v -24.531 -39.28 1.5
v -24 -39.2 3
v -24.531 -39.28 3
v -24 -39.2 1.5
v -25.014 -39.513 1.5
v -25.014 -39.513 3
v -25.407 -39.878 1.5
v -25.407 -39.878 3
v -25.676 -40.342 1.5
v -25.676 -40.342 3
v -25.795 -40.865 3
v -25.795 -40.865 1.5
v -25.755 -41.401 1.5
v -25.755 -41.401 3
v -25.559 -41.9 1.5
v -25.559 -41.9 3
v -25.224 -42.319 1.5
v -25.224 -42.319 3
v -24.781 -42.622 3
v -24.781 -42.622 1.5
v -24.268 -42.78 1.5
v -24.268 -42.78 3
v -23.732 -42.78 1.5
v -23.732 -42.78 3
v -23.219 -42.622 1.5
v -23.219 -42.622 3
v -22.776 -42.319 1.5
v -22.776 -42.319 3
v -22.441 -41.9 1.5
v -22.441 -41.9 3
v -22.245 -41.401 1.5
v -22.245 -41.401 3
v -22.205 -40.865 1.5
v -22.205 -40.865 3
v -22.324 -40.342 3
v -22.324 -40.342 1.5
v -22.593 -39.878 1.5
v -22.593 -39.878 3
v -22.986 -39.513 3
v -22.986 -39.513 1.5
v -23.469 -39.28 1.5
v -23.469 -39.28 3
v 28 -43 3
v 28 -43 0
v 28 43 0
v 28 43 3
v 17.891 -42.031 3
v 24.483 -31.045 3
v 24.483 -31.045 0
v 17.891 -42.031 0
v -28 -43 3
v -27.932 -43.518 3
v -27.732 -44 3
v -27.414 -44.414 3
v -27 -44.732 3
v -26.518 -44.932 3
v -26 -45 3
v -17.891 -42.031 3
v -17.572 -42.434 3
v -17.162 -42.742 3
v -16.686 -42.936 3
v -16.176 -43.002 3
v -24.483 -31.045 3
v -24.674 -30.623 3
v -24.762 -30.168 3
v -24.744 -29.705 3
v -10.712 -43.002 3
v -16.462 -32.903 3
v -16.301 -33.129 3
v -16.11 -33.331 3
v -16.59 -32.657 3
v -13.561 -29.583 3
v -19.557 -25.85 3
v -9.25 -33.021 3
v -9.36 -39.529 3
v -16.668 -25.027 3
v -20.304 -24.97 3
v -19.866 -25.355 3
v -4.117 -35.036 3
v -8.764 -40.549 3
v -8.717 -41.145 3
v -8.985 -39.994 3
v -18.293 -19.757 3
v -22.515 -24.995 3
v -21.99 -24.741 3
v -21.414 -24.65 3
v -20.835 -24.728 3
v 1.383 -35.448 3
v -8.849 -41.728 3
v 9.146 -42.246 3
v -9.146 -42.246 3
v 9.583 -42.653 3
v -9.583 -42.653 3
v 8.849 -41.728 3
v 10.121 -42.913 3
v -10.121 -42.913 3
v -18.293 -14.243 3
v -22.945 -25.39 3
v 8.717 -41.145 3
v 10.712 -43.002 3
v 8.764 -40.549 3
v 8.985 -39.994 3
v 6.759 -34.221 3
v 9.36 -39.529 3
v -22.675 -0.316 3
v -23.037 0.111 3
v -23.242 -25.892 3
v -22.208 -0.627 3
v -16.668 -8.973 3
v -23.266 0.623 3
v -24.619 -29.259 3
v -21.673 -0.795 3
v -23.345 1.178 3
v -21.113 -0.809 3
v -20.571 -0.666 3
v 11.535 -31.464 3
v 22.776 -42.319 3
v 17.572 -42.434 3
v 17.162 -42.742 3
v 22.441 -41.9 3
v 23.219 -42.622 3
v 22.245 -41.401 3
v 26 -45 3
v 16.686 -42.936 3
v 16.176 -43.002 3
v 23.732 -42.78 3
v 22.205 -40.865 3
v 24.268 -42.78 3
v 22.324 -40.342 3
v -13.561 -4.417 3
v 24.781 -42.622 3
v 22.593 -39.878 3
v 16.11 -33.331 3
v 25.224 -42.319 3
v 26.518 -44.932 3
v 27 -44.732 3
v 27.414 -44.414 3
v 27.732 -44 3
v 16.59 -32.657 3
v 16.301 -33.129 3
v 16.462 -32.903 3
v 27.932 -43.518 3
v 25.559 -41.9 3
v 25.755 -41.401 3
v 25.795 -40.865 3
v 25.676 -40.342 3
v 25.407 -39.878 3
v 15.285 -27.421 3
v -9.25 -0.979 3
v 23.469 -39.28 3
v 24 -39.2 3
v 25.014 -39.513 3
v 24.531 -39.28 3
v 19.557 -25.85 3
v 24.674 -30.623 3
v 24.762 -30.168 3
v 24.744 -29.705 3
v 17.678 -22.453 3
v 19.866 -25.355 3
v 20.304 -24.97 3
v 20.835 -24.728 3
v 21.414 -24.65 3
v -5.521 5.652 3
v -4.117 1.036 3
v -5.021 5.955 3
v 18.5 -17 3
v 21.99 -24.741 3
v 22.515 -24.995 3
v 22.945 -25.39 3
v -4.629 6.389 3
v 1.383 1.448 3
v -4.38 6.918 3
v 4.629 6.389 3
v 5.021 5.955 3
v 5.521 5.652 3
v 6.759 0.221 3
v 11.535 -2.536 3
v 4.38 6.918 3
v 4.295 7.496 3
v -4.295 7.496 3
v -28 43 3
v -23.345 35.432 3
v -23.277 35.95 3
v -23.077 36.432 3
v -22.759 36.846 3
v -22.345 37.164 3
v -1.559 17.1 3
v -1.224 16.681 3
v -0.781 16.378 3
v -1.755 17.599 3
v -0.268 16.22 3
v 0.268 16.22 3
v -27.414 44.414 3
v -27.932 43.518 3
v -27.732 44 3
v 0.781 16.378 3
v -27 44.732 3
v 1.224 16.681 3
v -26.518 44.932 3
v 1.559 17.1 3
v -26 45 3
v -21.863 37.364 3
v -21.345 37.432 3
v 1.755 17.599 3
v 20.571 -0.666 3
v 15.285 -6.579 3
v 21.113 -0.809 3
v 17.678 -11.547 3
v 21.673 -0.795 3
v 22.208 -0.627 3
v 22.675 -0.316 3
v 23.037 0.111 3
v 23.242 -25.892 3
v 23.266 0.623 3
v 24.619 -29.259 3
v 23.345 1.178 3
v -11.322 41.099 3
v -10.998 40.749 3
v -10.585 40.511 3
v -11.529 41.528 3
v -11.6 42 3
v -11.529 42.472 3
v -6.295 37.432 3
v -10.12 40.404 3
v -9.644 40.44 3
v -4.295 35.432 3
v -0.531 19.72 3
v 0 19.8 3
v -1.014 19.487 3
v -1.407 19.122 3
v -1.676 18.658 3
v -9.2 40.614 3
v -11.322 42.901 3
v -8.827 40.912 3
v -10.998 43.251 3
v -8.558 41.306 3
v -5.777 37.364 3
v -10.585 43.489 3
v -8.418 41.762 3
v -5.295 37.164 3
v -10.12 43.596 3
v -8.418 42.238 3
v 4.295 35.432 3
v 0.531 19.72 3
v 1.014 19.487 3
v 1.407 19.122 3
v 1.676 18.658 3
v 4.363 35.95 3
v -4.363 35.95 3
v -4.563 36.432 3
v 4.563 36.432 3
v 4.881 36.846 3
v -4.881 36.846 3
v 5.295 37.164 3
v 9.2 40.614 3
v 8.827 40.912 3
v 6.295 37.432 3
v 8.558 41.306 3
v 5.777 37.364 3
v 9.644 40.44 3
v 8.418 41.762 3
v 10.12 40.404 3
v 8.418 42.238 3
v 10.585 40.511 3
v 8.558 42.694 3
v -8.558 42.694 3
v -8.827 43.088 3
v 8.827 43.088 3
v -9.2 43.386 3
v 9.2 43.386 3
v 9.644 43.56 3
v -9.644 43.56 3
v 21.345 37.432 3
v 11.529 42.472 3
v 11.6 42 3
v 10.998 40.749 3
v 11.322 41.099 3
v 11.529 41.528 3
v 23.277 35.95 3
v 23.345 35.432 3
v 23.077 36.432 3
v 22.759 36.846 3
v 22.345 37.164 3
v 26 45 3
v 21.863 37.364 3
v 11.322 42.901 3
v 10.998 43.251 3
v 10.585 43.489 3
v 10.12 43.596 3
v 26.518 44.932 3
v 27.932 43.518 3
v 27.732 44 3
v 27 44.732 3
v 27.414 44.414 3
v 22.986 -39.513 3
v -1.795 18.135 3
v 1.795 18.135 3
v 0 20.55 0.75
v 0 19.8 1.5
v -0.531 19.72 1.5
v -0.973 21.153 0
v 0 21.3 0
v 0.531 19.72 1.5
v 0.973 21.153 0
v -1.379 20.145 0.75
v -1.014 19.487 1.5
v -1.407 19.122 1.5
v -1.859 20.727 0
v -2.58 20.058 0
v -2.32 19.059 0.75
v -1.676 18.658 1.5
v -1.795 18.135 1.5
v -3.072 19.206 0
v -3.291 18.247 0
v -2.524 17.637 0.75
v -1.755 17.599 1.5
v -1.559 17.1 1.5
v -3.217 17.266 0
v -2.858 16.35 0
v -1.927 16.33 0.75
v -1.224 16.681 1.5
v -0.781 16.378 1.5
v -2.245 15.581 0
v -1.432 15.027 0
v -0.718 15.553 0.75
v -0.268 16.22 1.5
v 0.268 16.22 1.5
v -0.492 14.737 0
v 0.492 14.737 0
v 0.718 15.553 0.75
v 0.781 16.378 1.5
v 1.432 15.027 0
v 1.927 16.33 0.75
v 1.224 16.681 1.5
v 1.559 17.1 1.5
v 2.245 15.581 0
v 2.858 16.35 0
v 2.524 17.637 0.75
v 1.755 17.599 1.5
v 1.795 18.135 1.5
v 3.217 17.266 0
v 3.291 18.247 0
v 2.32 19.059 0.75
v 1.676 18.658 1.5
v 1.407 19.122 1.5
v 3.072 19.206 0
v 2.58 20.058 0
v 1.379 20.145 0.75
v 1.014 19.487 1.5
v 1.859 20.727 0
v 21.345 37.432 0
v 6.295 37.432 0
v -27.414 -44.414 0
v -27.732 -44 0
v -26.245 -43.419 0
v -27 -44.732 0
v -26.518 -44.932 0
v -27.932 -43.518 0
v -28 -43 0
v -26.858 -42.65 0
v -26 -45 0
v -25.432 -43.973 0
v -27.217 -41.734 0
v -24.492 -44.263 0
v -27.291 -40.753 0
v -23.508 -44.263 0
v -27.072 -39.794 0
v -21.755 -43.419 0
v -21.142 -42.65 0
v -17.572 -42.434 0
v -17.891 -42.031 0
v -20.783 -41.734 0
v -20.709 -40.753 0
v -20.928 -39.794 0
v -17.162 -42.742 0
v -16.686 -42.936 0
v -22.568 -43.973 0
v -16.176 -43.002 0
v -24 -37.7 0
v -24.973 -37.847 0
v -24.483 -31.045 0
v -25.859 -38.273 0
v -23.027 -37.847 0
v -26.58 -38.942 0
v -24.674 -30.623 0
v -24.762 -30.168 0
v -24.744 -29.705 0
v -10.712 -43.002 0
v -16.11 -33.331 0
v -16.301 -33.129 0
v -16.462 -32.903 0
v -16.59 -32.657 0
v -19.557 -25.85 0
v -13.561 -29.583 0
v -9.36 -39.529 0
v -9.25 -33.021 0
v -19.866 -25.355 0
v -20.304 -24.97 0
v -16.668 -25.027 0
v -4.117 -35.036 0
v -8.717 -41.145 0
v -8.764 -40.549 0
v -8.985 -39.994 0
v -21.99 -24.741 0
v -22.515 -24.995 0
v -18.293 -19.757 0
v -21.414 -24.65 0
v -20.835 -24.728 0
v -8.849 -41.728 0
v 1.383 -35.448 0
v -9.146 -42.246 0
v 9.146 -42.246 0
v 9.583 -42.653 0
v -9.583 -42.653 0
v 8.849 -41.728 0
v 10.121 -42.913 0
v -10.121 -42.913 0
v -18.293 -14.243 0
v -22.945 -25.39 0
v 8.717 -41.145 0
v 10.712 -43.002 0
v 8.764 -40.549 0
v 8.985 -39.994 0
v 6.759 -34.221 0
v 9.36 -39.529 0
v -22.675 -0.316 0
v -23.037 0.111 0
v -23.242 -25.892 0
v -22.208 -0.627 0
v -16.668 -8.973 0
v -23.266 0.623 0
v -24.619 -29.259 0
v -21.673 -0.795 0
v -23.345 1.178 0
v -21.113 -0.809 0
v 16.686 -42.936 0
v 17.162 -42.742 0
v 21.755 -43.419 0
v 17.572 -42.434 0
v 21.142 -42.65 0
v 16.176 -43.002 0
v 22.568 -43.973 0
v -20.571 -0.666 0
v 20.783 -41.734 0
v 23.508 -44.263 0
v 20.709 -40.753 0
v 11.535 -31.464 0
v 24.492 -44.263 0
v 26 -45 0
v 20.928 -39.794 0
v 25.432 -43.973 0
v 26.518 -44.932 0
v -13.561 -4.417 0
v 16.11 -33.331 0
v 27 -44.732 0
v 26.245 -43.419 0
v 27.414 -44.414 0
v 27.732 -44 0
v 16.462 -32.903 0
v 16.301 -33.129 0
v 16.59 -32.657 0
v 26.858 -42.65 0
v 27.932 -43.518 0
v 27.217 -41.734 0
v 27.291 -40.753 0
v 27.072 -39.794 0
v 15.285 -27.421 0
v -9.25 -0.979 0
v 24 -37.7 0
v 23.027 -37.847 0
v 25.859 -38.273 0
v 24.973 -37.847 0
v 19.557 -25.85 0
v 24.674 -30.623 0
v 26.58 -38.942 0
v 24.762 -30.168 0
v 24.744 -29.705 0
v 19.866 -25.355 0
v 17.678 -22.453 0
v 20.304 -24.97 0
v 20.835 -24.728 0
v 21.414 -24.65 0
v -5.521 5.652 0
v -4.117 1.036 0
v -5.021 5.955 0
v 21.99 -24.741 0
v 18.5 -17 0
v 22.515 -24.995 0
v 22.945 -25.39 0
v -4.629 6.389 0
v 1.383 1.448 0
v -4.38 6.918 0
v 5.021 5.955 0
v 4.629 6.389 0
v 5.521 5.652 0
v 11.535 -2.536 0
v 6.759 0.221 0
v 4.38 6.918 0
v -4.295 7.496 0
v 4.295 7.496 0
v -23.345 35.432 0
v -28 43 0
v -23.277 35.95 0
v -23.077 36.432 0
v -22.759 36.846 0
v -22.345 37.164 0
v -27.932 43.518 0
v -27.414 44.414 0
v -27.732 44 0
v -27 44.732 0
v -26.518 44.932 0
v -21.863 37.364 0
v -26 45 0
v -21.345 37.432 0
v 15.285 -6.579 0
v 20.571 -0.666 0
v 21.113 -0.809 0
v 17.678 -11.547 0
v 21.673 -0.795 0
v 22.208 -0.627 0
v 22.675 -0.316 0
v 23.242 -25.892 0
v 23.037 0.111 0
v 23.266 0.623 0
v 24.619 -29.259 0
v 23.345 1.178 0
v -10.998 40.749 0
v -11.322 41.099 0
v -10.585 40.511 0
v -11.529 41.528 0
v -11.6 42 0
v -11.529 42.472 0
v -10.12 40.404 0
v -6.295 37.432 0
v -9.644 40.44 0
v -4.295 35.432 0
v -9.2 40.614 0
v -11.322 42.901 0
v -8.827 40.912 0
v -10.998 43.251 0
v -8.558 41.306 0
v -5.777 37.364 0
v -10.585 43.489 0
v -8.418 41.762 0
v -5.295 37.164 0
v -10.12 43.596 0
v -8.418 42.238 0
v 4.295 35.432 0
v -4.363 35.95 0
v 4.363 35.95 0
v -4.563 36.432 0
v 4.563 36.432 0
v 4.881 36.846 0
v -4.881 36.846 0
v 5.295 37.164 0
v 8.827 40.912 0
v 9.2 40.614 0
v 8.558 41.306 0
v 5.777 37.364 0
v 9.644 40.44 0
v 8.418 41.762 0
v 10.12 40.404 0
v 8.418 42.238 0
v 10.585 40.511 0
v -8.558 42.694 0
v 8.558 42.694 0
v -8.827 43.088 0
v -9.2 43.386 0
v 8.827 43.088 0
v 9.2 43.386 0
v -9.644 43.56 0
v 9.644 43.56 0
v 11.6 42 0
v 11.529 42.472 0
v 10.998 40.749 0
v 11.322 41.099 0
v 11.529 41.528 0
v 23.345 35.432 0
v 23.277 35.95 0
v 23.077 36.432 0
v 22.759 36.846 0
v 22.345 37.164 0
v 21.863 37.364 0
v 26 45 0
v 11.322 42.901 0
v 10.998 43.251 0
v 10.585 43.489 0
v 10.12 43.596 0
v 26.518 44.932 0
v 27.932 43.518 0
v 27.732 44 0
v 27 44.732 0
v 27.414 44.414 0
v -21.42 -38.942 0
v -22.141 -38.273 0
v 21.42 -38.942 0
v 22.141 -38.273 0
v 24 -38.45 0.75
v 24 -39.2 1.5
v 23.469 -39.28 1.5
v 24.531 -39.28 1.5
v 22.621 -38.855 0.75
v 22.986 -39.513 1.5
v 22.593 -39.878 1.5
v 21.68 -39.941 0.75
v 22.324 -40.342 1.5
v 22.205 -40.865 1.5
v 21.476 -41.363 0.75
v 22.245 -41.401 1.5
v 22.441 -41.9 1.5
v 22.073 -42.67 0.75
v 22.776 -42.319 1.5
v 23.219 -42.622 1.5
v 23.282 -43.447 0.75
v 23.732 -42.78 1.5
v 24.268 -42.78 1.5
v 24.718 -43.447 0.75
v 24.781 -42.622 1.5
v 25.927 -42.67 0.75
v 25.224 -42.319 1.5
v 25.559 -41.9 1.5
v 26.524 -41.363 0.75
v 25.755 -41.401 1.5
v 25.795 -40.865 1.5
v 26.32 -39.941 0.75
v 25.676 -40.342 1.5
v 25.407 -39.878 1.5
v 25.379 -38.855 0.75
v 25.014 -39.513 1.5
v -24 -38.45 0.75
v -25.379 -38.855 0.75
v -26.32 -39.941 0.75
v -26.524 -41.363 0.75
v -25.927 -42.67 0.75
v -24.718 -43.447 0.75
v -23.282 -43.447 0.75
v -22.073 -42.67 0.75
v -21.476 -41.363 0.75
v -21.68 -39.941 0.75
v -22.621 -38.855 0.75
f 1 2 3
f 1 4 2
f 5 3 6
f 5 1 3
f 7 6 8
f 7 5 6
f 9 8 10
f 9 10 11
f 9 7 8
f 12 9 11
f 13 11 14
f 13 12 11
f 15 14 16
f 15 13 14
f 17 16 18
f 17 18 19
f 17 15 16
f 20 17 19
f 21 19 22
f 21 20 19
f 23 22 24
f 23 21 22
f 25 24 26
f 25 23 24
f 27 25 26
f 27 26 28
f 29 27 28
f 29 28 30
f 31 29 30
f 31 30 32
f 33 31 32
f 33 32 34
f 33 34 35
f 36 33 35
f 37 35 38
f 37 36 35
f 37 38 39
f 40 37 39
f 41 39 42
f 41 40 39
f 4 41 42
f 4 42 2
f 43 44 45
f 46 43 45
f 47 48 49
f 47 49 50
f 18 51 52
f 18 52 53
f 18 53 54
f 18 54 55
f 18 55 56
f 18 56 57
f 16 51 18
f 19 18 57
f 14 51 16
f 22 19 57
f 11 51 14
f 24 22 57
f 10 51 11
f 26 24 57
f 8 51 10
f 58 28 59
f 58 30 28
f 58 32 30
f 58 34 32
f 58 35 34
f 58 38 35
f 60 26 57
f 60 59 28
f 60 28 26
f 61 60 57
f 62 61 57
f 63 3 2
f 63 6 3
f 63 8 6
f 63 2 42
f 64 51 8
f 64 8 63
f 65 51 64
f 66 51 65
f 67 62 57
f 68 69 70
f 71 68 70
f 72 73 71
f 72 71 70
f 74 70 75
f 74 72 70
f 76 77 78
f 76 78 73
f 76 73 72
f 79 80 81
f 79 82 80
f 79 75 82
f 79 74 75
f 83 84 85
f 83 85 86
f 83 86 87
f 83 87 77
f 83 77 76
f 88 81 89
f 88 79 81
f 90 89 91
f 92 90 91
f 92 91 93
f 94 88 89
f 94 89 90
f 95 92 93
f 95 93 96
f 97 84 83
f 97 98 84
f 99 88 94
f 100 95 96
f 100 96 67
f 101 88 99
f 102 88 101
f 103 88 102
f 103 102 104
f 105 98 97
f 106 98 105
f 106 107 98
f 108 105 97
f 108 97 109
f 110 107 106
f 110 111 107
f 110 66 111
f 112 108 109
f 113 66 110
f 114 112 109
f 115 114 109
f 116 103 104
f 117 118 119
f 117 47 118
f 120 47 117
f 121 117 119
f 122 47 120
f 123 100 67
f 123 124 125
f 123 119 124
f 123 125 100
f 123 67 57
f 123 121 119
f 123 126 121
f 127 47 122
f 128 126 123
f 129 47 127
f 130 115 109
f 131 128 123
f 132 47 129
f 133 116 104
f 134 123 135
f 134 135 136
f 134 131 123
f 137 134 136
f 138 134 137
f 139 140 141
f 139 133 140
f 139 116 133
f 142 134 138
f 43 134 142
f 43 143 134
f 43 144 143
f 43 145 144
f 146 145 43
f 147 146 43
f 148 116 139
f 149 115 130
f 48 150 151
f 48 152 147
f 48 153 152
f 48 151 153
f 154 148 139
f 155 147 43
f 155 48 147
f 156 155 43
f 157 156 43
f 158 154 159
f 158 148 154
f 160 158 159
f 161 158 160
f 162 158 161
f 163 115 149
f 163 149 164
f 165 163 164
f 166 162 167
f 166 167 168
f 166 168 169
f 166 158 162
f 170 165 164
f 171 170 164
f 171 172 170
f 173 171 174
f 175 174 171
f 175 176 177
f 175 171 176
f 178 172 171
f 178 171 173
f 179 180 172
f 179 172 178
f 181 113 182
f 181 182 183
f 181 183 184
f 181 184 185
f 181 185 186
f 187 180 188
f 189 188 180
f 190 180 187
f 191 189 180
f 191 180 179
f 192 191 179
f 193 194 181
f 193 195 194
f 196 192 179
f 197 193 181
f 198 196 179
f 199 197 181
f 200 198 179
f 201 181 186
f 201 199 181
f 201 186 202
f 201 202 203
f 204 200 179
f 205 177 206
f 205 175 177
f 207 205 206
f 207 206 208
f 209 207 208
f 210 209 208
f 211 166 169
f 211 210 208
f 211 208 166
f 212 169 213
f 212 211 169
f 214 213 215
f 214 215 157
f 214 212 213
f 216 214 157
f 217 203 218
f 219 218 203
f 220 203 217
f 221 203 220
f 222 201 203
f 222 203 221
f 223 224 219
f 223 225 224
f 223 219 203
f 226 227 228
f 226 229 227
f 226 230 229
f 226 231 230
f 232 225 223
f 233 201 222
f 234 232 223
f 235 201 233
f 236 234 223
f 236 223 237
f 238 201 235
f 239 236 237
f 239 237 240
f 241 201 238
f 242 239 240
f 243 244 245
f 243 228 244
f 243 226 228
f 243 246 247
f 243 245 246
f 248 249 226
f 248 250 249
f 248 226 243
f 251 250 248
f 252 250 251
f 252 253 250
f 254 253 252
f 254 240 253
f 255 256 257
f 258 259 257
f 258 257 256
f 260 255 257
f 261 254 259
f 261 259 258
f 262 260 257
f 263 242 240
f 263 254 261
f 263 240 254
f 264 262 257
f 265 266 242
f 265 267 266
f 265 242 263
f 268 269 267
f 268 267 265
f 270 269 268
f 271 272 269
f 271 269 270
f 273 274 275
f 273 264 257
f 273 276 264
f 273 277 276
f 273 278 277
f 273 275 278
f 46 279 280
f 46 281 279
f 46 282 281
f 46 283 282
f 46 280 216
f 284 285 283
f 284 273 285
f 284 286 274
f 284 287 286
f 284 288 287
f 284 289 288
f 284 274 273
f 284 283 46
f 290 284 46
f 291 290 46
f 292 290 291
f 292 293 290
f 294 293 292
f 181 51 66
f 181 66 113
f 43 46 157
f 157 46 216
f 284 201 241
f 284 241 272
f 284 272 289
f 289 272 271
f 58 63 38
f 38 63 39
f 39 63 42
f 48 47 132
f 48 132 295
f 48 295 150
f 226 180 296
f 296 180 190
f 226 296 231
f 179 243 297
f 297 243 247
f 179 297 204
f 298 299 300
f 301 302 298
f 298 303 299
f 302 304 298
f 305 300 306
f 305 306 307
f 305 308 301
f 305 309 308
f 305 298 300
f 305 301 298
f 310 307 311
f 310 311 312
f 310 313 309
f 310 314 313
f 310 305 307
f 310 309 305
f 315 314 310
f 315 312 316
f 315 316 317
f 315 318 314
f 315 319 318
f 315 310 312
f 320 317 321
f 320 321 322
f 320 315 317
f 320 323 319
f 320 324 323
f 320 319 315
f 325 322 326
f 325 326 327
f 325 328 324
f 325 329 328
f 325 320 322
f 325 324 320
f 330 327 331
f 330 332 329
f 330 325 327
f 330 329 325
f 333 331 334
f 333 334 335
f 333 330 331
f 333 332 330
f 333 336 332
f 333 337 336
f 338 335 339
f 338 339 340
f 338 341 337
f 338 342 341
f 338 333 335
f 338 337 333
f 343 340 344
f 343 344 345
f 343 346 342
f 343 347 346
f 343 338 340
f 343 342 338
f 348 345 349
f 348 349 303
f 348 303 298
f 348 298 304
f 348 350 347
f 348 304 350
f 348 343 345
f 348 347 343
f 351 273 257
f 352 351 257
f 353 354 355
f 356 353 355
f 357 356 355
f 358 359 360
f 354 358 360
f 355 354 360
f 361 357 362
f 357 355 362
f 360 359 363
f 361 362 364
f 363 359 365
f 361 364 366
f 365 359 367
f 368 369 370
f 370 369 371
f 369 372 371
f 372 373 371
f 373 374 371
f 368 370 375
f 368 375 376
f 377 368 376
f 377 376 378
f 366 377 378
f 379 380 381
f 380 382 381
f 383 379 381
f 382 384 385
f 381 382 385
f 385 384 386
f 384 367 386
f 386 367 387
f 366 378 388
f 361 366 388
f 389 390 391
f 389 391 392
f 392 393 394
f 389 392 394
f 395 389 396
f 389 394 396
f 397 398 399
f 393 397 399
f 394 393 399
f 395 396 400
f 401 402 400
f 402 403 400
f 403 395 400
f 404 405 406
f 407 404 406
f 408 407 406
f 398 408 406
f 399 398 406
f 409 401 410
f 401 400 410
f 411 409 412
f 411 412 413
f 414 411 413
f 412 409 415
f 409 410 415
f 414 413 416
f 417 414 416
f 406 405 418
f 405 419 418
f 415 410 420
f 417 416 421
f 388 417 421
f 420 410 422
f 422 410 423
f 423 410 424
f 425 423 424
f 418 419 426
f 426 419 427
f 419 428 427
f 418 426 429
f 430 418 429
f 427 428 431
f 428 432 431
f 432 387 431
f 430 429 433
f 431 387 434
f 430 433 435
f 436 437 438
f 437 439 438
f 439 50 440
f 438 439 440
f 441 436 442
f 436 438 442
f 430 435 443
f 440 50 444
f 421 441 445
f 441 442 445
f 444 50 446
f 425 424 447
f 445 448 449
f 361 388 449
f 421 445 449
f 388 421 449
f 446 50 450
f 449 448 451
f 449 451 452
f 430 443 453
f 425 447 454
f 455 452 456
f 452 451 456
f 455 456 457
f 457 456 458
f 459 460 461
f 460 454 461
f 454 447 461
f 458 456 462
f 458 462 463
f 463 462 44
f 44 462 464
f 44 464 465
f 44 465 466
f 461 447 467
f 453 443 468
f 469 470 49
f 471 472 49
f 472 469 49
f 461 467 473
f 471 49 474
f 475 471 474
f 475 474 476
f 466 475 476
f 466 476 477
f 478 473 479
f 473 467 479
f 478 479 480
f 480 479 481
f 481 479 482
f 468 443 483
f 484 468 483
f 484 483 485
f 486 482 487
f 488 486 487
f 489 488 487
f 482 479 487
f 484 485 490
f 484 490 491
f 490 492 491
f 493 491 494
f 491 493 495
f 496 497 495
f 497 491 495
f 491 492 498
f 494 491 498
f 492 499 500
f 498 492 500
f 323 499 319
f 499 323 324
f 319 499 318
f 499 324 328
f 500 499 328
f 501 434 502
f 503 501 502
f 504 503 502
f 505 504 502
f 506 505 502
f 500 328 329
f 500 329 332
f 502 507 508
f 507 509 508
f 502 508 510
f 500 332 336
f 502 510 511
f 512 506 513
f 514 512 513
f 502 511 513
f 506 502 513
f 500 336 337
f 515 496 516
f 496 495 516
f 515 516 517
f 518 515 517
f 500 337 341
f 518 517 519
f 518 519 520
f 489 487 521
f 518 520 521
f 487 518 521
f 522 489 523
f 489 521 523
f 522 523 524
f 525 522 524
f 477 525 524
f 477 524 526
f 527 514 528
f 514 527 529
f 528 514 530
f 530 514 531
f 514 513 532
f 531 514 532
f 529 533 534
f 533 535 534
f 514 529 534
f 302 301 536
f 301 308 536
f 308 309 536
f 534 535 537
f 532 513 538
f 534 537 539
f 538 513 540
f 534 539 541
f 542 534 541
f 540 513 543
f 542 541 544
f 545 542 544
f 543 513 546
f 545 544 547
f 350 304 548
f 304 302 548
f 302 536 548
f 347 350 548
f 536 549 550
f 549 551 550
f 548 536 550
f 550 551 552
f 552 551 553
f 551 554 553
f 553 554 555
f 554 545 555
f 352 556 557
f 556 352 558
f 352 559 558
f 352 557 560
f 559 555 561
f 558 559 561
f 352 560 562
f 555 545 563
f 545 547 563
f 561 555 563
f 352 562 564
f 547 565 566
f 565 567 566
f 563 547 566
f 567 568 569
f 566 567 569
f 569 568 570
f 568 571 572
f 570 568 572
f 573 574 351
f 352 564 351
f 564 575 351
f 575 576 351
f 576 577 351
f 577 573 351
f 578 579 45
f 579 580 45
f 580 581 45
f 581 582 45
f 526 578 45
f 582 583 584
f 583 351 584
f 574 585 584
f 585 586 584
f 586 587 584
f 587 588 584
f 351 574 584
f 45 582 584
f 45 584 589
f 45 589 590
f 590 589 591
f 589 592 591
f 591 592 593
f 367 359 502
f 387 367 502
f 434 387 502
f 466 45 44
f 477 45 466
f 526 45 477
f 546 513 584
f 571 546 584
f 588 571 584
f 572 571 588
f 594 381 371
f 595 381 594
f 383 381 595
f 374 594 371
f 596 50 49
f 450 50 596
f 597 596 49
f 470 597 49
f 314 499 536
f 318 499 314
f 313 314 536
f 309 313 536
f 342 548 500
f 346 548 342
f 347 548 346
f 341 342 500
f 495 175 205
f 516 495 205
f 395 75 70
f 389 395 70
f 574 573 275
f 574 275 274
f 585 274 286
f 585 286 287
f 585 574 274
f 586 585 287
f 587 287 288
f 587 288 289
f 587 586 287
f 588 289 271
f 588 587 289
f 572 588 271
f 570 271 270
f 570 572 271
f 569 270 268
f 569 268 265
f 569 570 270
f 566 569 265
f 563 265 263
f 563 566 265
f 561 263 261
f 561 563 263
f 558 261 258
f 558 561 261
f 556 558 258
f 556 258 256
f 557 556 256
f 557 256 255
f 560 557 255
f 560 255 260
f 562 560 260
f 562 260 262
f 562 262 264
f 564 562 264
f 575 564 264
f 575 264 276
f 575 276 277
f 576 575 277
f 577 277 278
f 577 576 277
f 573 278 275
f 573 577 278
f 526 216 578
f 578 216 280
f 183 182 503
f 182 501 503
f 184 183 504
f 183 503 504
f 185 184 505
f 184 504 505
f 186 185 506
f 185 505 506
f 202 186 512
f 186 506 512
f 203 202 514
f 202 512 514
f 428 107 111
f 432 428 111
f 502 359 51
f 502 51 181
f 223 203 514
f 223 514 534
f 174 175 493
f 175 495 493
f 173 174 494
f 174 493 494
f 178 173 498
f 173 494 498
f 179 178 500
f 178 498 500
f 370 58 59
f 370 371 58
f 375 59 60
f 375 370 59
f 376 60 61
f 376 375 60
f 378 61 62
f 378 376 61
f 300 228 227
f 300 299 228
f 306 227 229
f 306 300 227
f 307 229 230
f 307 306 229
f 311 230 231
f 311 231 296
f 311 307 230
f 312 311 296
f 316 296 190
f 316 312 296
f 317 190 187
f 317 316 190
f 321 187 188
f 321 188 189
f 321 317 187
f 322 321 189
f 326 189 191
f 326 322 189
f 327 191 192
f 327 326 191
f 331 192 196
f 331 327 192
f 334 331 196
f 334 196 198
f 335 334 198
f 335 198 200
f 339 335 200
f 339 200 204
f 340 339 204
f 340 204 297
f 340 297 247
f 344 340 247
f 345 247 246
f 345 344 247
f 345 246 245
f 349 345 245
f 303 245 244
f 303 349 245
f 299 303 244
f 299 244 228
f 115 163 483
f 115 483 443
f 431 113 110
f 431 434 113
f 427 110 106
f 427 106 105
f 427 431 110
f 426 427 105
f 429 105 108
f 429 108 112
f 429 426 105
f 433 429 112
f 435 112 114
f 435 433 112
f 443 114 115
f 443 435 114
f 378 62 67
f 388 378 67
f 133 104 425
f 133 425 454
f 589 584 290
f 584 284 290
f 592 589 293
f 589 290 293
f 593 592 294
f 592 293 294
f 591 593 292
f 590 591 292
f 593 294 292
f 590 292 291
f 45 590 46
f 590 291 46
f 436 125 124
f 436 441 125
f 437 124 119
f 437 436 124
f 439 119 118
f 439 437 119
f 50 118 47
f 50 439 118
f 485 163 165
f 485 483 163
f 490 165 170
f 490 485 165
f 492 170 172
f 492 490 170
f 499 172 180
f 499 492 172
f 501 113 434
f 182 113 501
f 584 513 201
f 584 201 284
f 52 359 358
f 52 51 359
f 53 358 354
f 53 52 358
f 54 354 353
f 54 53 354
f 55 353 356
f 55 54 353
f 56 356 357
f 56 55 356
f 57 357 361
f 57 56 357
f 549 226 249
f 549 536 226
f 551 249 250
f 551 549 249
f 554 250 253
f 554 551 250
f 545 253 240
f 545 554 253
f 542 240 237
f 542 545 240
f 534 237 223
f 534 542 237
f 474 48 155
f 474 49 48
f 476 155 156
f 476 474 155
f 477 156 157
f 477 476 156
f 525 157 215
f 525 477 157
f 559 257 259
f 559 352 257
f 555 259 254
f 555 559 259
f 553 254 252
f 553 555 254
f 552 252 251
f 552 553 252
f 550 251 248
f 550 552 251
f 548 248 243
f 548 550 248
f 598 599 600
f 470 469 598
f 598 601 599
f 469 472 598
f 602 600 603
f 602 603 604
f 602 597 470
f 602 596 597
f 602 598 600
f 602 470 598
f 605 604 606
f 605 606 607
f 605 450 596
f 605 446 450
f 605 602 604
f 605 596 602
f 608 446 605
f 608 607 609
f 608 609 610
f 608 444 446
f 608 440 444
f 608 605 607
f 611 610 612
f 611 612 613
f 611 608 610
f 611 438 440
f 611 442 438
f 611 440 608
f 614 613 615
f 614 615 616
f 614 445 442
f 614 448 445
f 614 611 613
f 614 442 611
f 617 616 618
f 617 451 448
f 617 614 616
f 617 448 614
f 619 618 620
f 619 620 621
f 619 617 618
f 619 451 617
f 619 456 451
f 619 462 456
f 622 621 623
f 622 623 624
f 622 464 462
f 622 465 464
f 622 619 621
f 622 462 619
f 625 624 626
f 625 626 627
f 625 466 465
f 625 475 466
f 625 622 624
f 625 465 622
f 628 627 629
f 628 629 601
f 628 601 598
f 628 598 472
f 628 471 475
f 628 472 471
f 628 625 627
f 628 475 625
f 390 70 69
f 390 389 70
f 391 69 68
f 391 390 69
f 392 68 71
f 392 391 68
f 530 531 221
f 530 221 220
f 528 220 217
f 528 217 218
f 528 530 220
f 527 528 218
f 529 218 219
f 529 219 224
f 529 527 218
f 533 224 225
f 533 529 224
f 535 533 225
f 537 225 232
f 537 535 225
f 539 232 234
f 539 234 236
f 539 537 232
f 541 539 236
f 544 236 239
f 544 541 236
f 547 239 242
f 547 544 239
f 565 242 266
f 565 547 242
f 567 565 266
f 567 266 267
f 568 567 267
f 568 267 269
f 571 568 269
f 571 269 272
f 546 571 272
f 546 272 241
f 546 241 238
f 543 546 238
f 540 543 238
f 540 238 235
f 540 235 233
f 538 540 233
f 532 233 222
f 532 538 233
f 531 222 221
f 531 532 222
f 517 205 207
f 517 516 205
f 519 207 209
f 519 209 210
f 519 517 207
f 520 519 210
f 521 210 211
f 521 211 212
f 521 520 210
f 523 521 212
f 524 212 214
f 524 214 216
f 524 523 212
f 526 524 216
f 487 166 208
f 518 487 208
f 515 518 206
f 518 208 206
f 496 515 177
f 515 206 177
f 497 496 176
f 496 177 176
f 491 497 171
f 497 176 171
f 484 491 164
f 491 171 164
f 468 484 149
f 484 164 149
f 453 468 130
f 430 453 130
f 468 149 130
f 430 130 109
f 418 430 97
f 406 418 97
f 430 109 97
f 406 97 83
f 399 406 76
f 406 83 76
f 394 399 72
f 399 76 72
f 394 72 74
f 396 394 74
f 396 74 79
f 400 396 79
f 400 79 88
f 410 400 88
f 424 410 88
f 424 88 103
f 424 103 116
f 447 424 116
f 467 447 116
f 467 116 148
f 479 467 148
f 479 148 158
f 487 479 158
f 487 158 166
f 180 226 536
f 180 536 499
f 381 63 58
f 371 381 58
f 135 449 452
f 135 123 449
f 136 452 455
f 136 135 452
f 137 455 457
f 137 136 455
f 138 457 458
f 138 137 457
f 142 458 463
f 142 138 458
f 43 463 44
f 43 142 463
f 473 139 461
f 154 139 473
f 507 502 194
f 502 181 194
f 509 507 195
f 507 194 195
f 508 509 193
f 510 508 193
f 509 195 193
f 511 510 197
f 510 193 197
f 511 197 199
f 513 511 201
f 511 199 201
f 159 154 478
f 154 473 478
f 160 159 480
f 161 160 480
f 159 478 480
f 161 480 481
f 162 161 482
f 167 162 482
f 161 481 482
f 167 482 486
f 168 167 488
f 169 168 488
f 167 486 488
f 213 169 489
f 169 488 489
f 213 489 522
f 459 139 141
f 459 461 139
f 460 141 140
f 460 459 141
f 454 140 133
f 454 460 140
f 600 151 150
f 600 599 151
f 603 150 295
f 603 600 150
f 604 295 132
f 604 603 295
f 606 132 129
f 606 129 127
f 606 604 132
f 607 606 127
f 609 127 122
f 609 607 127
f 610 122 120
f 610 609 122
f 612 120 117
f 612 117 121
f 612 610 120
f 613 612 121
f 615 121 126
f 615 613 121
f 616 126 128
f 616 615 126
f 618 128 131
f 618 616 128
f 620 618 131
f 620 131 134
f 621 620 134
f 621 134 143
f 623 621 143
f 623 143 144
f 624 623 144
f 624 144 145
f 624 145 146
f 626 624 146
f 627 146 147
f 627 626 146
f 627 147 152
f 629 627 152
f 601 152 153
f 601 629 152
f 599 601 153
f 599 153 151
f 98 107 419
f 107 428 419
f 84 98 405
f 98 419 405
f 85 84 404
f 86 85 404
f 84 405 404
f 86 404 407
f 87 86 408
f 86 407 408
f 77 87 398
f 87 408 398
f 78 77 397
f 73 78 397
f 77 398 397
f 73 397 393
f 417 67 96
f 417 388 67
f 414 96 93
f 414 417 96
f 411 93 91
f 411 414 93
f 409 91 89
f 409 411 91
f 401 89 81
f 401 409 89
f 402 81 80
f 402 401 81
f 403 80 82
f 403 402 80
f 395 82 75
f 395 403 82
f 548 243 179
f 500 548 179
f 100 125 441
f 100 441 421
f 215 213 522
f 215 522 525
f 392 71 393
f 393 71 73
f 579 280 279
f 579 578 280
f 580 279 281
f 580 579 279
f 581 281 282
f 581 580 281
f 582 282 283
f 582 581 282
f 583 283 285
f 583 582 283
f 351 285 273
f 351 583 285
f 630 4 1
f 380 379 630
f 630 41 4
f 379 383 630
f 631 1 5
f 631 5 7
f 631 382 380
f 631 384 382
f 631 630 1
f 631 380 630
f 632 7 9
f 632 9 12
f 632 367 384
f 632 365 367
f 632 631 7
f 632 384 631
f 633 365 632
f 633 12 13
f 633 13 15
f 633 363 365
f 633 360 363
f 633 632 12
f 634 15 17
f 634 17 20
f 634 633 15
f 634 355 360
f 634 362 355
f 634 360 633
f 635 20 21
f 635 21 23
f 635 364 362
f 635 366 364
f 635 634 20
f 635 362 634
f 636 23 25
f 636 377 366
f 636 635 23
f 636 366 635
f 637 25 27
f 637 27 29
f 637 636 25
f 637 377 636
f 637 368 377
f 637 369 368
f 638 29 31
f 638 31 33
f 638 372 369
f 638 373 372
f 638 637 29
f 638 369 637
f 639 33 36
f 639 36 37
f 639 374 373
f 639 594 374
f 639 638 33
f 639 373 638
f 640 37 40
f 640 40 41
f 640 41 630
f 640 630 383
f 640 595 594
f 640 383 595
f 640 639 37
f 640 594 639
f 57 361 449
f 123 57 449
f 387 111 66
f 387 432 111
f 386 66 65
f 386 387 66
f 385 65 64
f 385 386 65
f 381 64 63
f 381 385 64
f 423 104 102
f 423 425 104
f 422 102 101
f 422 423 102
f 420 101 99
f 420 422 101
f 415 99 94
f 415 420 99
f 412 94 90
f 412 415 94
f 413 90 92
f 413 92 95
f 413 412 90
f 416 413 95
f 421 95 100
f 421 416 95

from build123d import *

# Parameters (mm, degrees)
SKETCH_1_W                  = 56
SKETCH_1_H                  = 90
SKETCH_1_R                  = 1.6
EXTRUDE_1_DEPTH             = 3
SKETCH_2_R                  = 18.5
SKETCH_2_R_2                = 1.6
CUT_EXTRUDE_1_DEPTH         = 54.08483776
FILLET_1_R                  = 2
CUT_EXTRUDE_2_DEPTH         = 54.08483776
FILLET_2_R                  = 2
HOLE_WIZARD_M3_1_AT_2_COUNT = 2
HOLE_WIZARD_M3_1_AT_2_PITCH = 63.694583757
HOLE_WIZARD_M3_1_AT_3_COUNT = 2
HOLE_WIZARD_M3_1_AT_3_PITCH = 63.694583757


with BuildPart() as part:
    # 草图1 → 凸台-拉伸1 (new body)
    with BuildSketch(Plane.XY):
        Rectangle(SKETCH_1_W, SKETCH_1_H)
        with Locations((10, 42)):
            Circle(SKETCH_1_R, mode=Mode.SUBTRACT)
        with Locations(Location((-10, 42, 0), (0, 0, 180))):
            Circle(SKETCH_1_R, mode=Mode.SUBTRACT)
    extrude(amount=EXTRUDE_1_DEPTH)

    # 草图2 → 切除-拉伸1 (cut, through all)
    with BuildSketch(Plane.XY.offset(3)):
        with Locations((0, -17)):
            Circle(SKETCH_2_R)
        with Locations((0, 18)):
            Circle(SKETCH_2_R_2)
        with Locations((24, -41)):
            Circle(SKETCH_2_R_2)
        with Locations(Location((-24, -41, 0), (0, 0, 180))):
            Circle(SKETCH_2_R_2)
    extrude(amount=-CUT_EXTRUDE_1_DEPTH, mode=Mode.SUBTRACT)

    # 圆角1
    fillet_1_edges = [part.edges().sort_by_distance(p)[0] for p in [
        (28, -45, 1.5),
        (-28, -45, 1.5),
        (-28, 45, 1.5),
        (28, 45, 1.5),
    ]]
    fillet(fillet_1_edges, radius=FILLET_1_R)

    # 草图3 → 切除-拉伸2 (cut, through all)
    with BuildSketch(Plane.XY.offset(3)):
        Polygon((-23.345028529, 37.432122744), (-4.29507275, 37.432122744), (-4.29507275, 6.166928146), (-23.345028529, -1.831144891), align=None)
        Polygon((4.29507275, 6.166928146), (23.345028529, -1.831144891), (23.345028529, 37.432122744), (4.29507275, 37.432122744), align=None)
        Polygon((-21.449213, -21.510239836), (-24.998316916, -30.185827186), (-17.308591765, -43.00203577), (-5.576831599, -43.00203577), (-16.421315786, -33.044827562), align=None)
        Polygon((21.449213, -21.510239836), (24.998316916, -30.185827186), (17.308591765, -43.00203577), (5.576831599, -43.00203577), (16.421315786, -33.044827562), align=None)
    extrude(amount=-CUT_EXTRUDE_2_DEPTH, mode=Mode.SUBTRACT)

    # 圆角2
    fillet_2_edges = [part.edges().sort_by_distance(p)[0] for p in [
        (-5.576831599, -43.00203577, 1.5),
        (-17.308591765, -43.00203577, 1.5),
        (-24.998316916, -30.185827186, 1.5),
        (-21.449213, -21.510239836, 1.5),
        (-16.421315786, -33.044827562, 1.5),
        (-23.345028529, -1.831144891, 1.5),
        (-23.345028529, 37.432122744, 1.5),
        (-4.29507275, 37.432122744, 1.5),
        (-4.29507275, 6.166928146, 1.5),
        (4.29507275, 6.166928146, 1.5),
        (4.29507275, 37.432122744, 1.5),
        (23.345028529, 37.432122744, 1.5),
        (23.345028529, -1.831144891, 1.5),
        (16.421315786, -33.044827562, 1.5),
        (21.449213, -21.510239836, 1.5),
        (24.998316916, -30.185827186, 1.5),
        (17.308591765, -43.00203577, 1.5),
        (5.576831599, -43.00203577, 1.5),
    ]]
    fillet(fillet_2_edges, radius=FILLET_2_R)

    # 草图5 → M3 十字槽半沉头木螺钉的锥形沉头孔1 (revolve, cut)
    with BuildSketch(Plane(origin=(0, 18, 0), x_dir=(0, 1, 0), z_dir=(1, 0, 0))):
        Polygon((0, 0), (0, 3), (1.8, 3), (1.8, 1.5), (3.3, 0), align=None)
    hole_wizard_m3_1 = revolve(axis=Axis((0, 18, -6.35), (0, 0, 1)), mode=Mode.SUBTRACT)

    # M3 十字槽半沉头木螺钉的锥形沉头孔1 at 2: M3 十字槽半沉头木螺钉的锥形沉头孔1 ×2
    with Locations(*[Vector(-0.3767981292019326, -0.9262954009547514, 0) * (i * HOLE_WIZARD_M3_1_AT_2_PITCH) for i in range(1, HOLE_WIZARD_M3_1_AT_2_COUNT)]):
        add(hole_wizard_m3_1, mode=Mode.SUBTRACT)

    # M3 十字槽半沉头木螺钉的锥形沉头孔1 at 3: M3 十字槽半沉头木螺钉的锥形沉头孔1 ×2
    with Locations(*[Vector(0.3767981292019329, -0.9262954009547514, 0) * (i * HOLE_WIZARD_M3_1_AT_3_PITCH) for i in range(1, HOLE_WIZARD_M3_1_AT_3_COUNT)]):
        add(hole_wizard_m3_1, mode=Mode.SUBTRACT)


solid = part.part
